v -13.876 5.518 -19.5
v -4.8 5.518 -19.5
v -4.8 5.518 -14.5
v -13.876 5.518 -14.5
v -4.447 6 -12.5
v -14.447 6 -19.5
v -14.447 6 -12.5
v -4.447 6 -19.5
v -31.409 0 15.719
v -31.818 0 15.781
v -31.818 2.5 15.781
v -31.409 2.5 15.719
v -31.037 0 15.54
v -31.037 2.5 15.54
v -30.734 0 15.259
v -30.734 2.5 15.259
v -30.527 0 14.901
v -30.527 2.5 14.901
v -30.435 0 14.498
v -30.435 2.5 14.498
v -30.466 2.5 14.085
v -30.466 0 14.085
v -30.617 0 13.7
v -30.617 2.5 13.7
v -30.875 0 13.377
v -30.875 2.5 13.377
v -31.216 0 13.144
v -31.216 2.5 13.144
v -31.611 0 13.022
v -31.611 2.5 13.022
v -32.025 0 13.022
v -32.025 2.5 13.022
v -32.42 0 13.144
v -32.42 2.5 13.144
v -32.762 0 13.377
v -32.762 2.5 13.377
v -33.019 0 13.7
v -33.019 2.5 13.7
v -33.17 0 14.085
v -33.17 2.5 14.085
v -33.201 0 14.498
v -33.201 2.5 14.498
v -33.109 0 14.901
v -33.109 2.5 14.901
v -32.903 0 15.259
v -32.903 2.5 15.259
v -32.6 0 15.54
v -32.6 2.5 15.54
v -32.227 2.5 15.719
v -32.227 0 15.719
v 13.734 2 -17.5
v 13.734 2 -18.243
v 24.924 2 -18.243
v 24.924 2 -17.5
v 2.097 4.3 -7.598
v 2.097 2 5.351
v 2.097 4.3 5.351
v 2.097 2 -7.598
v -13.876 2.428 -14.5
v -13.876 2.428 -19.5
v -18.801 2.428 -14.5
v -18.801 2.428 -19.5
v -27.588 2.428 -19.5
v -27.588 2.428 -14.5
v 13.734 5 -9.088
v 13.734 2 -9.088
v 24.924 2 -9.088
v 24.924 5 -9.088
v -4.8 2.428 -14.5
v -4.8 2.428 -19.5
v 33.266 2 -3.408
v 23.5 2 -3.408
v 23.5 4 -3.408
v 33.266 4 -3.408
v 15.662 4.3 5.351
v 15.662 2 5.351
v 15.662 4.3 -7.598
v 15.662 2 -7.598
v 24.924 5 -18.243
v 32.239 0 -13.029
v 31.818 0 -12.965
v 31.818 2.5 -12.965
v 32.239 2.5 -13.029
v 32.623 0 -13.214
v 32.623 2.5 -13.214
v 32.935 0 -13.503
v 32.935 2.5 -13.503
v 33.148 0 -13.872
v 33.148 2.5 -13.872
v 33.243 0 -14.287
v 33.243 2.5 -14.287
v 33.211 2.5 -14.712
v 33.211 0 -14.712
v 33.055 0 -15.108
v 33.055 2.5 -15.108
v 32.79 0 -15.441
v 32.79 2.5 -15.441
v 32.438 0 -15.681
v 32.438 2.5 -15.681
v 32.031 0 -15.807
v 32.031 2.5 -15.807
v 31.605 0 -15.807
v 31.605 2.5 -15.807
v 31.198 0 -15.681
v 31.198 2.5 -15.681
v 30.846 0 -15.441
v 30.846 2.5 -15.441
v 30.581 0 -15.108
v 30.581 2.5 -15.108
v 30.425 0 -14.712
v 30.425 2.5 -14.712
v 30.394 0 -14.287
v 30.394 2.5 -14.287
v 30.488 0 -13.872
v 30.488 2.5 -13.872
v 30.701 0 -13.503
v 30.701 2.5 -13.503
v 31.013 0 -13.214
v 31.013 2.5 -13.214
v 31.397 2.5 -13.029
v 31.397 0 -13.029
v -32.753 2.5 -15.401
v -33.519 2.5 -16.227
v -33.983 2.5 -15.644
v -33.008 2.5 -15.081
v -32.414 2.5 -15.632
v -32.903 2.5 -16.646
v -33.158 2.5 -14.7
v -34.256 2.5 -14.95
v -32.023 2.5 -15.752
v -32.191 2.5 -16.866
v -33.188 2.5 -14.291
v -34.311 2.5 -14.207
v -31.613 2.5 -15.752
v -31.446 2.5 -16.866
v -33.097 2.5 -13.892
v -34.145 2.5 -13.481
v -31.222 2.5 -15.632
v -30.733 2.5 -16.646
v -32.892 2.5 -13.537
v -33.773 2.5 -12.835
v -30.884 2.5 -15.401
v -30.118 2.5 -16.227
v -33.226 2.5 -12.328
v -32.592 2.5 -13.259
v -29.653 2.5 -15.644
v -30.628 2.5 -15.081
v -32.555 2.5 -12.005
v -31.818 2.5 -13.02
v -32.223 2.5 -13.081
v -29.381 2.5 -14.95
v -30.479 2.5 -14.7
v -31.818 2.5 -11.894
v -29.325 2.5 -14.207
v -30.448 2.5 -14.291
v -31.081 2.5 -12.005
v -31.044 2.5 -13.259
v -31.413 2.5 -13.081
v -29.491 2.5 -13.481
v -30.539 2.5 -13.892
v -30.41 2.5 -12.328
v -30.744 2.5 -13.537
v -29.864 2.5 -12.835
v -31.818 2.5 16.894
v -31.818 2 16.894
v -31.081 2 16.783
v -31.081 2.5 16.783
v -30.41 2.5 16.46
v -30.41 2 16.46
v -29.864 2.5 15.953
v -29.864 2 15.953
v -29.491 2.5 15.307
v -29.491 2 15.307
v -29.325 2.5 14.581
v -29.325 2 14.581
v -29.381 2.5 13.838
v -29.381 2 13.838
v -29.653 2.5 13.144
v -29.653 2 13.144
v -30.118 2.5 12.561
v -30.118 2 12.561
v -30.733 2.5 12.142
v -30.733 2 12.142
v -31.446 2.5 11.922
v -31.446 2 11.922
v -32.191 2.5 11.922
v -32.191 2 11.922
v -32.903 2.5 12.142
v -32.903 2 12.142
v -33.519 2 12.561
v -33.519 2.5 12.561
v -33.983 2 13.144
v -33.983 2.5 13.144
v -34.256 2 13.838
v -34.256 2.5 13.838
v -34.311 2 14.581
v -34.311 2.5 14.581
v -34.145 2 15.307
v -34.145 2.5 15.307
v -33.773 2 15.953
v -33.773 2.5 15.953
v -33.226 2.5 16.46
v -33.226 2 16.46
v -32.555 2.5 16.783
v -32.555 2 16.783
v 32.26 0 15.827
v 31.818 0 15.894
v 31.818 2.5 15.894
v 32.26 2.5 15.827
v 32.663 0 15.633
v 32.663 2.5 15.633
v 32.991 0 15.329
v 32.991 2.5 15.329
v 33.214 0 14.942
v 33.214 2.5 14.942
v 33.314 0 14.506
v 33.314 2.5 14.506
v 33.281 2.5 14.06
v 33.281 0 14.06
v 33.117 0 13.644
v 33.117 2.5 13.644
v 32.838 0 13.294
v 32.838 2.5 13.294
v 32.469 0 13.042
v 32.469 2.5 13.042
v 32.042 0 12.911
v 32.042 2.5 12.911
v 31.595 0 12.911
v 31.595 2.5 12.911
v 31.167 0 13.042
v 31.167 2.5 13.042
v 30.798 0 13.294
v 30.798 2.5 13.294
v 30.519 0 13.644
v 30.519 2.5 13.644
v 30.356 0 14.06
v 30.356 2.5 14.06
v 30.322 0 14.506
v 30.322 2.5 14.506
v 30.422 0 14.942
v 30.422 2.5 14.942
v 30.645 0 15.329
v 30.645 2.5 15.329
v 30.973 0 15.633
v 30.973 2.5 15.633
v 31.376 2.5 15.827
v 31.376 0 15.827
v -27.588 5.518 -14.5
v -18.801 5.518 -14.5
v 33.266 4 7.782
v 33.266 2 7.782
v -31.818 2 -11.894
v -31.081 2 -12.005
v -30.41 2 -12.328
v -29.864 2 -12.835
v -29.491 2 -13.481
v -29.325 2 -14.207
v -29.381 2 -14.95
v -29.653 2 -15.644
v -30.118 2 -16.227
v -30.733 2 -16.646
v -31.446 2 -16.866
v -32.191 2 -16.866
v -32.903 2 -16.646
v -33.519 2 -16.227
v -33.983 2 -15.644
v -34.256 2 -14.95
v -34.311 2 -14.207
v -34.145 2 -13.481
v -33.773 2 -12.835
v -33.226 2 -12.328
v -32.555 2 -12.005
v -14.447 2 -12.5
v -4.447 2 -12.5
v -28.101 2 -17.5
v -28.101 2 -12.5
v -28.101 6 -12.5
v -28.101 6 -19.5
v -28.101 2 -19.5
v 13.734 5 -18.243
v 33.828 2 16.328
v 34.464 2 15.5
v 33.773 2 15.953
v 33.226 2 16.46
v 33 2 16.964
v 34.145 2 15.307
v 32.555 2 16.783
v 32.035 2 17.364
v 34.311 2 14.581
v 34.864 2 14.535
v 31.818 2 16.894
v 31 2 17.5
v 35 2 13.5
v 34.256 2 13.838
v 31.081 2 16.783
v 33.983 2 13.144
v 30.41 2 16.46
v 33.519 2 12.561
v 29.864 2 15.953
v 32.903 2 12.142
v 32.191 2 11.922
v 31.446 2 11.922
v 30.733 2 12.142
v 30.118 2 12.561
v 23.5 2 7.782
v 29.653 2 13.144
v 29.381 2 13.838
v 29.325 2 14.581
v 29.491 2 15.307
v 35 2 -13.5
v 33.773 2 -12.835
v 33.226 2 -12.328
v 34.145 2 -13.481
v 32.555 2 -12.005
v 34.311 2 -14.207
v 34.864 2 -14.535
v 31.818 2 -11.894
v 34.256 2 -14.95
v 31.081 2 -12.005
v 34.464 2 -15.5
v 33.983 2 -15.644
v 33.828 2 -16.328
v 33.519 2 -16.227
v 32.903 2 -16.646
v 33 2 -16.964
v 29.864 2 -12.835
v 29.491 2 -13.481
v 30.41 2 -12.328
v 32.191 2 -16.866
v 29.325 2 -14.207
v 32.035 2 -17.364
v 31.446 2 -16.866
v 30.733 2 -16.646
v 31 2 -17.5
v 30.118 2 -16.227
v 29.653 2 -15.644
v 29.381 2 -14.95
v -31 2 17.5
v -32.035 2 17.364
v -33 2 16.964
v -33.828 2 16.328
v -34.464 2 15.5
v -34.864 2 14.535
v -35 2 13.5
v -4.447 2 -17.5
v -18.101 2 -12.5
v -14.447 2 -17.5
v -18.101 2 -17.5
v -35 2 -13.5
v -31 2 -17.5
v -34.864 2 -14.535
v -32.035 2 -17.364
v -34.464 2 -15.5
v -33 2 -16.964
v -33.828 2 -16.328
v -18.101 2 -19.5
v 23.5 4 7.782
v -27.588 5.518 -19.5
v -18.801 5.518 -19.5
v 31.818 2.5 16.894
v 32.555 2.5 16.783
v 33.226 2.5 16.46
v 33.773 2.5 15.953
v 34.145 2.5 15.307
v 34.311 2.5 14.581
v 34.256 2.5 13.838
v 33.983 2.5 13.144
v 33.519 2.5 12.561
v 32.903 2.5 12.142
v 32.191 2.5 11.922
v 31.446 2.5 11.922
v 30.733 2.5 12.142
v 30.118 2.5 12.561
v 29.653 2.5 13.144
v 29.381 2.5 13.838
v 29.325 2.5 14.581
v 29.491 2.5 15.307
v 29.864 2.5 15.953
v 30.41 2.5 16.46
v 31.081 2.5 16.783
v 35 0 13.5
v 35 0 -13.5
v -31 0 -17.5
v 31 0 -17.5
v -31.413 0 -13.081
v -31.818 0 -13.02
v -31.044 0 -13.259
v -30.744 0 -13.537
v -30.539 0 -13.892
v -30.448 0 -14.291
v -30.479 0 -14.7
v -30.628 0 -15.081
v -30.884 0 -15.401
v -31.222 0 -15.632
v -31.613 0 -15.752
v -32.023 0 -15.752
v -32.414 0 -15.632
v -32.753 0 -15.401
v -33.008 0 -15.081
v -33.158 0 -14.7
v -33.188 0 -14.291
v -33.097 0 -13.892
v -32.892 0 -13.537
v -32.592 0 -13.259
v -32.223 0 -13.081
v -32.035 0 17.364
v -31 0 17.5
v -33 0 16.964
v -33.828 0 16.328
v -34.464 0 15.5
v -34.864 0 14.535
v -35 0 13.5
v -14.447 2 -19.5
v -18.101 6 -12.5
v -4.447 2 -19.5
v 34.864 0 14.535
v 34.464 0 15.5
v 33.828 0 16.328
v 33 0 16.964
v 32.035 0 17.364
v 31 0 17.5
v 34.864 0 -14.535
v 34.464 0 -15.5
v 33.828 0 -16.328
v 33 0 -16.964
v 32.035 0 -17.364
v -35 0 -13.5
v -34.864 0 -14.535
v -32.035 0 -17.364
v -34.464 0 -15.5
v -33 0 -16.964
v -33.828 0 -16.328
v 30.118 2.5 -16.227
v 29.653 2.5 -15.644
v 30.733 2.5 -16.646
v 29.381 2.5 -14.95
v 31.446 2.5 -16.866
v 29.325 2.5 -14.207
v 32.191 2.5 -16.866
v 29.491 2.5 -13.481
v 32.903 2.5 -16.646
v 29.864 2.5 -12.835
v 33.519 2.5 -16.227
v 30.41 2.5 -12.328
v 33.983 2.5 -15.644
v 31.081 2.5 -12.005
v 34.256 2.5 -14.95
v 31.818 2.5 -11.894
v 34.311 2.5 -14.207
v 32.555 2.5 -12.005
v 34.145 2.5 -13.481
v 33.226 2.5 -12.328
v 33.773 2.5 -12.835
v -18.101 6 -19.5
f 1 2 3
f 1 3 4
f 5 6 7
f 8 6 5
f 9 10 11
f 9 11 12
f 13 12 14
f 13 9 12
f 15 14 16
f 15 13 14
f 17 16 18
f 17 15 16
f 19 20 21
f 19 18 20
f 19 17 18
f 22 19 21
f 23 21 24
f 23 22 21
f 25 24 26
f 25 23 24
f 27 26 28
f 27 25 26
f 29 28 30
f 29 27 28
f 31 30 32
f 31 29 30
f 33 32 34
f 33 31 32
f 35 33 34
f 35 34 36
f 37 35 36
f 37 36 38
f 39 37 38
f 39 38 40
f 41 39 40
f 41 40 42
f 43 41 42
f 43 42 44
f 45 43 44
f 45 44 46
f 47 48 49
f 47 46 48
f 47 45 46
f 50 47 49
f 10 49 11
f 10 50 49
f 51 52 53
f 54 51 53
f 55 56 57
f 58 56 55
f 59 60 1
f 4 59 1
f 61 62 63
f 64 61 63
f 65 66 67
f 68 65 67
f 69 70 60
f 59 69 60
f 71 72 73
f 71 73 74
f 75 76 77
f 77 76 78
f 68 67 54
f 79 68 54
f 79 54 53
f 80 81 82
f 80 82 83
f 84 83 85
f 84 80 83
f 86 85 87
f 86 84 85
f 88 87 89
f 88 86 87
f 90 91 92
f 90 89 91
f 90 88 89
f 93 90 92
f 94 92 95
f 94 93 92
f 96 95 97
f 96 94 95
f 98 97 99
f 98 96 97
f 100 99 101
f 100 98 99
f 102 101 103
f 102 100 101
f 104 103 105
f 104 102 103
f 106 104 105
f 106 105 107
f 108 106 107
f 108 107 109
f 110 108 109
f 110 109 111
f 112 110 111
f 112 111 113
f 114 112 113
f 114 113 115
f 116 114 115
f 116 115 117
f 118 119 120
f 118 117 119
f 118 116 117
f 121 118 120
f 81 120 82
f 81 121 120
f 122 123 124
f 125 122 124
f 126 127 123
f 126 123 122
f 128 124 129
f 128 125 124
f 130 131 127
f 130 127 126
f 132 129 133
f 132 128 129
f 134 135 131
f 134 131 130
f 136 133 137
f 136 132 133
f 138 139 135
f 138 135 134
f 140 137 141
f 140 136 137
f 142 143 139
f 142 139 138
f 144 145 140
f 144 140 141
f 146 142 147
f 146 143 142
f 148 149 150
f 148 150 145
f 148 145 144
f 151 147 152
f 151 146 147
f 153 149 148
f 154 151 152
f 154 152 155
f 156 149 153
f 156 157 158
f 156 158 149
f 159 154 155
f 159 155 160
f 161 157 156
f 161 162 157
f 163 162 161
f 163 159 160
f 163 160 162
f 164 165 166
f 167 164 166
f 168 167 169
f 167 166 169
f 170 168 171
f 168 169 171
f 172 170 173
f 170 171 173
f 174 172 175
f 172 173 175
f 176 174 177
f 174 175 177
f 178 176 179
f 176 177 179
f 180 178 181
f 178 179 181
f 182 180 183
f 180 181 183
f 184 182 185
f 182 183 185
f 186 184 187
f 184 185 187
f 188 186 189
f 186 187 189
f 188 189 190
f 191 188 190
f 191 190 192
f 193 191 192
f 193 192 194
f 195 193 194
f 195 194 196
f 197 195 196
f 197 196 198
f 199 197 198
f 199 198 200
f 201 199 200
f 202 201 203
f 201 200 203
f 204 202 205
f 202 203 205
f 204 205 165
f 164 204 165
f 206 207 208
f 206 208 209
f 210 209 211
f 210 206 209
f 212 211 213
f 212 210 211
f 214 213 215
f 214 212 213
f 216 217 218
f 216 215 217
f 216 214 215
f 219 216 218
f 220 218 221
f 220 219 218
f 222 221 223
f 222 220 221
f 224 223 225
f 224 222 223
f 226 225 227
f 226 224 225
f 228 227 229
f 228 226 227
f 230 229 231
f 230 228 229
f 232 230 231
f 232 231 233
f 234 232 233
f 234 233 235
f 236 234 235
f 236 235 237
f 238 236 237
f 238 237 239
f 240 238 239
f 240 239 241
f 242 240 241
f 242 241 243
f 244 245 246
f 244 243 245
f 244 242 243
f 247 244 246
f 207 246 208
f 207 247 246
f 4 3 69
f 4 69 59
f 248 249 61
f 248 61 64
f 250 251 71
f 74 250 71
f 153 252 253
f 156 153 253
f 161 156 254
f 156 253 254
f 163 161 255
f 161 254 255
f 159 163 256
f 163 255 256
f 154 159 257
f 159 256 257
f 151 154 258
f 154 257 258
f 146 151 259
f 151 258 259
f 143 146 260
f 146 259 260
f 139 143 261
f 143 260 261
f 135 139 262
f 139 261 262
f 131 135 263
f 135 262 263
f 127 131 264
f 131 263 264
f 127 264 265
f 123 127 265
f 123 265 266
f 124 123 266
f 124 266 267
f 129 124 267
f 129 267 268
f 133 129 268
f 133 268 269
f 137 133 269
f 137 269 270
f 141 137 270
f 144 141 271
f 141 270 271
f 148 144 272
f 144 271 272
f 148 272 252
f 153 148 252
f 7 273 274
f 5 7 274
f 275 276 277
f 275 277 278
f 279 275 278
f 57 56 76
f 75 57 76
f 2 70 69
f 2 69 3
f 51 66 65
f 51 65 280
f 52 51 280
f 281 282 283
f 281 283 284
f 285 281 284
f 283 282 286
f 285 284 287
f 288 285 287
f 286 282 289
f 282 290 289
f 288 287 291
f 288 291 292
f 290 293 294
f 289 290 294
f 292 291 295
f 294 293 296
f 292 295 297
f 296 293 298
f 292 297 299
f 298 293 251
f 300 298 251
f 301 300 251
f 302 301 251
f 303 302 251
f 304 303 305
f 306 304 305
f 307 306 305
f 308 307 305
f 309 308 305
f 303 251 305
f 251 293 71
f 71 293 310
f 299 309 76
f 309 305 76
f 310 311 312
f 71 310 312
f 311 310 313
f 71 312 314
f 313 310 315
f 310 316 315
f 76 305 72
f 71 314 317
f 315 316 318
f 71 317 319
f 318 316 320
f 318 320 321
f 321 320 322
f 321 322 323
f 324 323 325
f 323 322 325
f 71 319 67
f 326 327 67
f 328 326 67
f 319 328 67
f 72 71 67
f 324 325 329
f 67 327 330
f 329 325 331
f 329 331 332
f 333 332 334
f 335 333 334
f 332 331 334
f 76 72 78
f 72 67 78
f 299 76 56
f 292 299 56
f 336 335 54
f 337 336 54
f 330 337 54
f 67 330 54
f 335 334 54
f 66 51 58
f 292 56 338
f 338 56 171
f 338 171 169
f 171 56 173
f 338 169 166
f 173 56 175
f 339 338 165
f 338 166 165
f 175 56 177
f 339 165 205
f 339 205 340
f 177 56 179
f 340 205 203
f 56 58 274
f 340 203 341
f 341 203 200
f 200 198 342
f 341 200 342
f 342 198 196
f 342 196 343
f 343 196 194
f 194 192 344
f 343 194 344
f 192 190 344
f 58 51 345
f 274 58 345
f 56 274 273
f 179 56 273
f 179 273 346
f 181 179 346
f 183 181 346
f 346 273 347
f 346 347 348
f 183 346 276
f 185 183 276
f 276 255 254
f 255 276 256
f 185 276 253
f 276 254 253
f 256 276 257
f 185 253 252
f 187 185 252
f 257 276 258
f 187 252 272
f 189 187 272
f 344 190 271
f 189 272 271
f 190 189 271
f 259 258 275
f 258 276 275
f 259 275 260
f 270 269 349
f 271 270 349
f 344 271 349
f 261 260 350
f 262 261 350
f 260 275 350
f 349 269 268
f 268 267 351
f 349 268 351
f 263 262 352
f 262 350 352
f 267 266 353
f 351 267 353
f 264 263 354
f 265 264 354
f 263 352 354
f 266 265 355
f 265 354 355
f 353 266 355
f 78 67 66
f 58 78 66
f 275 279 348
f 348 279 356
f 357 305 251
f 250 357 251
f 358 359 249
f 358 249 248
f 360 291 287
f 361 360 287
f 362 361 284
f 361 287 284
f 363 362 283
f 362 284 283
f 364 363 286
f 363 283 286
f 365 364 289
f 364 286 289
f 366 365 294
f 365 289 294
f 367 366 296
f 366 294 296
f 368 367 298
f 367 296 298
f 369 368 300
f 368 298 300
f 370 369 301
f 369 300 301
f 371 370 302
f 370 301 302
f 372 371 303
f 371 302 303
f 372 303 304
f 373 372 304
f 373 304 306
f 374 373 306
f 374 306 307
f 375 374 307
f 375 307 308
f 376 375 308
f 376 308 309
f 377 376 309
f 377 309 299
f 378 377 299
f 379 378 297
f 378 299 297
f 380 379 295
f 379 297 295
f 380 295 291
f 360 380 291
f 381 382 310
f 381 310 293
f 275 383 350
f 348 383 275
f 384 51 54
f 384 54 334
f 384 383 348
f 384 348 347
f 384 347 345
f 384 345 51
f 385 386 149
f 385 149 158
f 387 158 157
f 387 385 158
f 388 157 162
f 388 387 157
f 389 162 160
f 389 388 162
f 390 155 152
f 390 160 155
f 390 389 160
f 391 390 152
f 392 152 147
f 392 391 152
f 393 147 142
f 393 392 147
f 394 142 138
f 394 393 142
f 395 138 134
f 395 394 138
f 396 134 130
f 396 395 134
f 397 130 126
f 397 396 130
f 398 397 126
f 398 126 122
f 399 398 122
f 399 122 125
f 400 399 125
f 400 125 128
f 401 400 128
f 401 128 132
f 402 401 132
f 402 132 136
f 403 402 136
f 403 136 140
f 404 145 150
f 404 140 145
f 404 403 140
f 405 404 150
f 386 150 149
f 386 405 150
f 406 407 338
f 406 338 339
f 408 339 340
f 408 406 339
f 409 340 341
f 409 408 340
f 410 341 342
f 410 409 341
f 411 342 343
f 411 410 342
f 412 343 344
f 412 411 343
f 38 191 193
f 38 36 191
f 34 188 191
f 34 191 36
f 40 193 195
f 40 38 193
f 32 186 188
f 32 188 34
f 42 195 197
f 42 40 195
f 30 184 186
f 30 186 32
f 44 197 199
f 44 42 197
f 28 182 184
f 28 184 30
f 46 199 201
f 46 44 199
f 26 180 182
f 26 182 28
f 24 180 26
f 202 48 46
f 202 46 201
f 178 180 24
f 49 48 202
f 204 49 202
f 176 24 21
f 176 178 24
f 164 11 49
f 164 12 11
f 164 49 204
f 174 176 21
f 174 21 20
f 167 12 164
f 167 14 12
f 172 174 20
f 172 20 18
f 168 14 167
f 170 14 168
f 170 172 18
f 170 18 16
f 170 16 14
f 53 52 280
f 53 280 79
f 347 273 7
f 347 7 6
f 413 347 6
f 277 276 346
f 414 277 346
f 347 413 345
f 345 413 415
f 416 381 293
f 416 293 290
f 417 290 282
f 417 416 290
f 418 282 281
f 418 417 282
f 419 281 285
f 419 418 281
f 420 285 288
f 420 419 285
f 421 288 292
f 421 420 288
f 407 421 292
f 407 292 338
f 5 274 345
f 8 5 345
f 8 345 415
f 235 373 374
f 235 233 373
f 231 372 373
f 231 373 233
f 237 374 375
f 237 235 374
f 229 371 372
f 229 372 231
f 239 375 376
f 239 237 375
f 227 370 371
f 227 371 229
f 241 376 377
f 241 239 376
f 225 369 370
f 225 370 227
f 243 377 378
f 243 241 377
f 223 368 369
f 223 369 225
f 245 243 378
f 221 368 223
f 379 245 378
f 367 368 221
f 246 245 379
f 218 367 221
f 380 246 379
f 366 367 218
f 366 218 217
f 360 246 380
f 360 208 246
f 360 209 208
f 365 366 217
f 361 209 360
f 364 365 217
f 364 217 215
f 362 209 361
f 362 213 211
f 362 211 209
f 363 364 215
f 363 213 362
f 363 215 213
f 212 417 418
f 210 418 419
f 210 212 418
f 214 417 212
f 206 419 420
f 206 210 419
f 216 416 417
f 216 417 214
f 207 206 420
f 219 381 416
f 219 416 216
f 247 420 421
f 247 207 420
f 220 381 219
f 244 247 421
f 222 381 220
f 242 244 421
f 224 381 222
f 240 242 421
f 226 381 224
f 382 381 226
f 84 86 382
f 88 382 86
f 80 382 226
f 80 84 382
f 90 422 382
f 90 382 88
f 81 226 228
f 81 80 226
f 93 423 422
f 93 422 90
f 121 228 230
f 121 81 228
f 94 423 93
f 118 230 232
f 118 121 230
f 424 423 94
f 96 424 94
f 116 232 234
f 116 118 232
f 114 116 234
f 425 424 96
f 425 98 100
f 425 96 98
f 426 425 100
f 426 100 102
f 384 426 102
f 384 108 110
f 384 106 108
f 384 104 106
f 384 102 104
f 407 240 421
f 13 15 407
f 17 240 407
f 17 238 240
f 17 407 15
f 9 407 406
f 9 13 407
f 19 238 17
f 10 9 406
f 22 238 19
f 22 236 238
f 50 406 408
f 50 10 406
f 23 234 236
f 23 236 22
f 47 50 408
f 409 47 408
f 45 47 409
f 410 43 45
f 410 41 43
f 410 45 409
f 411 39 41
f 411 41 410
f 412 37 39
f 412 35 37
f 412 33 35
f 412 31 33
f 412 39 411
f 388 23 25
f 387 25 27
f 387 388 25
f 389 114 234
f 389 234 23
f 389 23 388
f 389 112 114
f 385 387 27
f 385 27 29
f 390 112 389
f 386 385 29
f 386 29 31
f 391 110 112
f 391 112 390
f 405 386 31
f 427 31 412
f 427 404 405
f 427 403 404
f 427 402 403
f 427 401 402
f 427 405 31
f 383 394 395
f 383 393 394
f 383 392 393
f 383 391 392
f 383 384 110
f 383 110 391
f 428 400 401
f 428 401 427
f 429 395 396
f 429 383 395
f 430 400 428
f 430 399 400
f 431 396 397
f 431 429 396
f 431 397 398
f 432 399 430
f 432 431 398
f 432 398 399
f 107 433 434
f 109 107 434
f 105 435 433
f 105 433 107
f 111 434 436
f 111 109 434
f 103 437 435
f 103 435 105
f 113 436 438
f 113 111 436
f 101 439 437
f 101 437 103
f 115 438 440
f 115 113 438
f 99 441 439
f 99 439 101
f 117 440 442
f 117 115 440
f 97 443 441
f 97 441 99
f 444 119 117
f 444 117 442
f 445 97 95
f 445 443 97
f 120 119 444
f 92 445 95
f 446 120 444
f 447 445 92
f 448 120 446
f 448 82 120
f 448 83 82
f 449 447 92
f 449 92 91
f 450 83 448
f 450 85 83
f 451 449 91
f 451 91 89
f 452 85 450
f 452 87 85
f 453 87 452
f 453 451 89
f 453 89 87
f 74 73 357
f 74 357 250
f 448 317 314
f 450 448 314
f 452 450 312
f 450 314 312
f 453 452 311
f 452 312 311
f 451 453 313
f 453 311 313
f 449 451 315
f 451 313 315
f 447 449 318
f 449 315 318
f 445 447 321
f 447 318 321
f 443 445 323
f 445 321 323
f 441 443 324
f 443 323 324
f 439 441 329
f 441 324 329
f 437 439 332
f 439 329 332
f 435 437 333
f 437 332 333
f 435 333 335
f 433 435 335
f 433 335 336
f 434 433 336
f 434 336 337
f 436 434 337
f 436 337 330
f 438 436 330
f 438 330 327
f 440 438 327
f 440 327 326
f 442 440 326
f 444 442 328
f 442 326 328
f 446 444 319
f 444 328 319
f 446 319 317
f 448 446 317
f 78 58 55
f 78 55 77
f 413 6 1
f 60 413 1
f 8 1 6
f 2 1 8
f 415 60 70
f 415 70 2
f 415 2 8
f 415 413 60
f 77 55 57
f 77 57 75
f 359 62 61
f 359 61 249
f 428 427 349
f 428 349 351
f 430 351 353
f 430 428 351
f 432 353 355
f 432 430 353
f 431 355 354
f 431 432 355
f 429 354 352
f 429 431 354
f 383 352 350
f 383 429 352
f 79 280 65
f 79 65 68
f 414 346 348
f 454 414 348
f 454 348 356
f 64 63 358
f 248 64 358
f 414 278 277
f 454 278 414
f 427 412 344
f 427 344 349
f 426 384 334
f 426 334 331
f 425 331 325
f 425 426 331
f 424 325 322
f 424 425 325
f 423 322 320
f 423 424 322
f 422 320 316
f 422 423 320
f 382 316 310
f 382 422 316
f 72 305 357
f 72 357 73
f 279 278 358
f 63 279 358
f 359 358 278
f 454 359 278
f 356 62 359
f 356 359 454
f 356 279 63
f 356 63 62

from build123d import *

# Parameters (mm, degrees)
BOSS_EXTRUDE1_DEPTH     = 2
SKETCH2_R               = 2.5
BOSS_EXTRUDE2_DEPTH     = 0.5
CUT_EXTRUDE1_DEPTH      = 40.182266397
CUT_EXTRUDE1_DEPTH_BACK = 40.182266397
SKETCH3_R               = 1.5
SKETCH3_R_2             = 1.3870402
SKETCH3_R_3             = 1.37388591
SKETCH3_R_4             = 1.428673318
SKETCH4_W               = 13.56544722
SKETCH4_H               = 12.948835983
BOSS_EXTRUDE3_DEPTH     = 2.3
SKETCH5_W               = 9.766151407
SKETCH5_H               = 11.19038182
BOSS_EXTRUDE4_DEPTH     = 2
SKETCH6_W               = 10
SKETCH6_H               = 7
BOSS_EXTRUDE5_DEPTH     = 4
SKETCH7_W               = 9.076584157
SKETCH7_H               = 3.089900989
SKETCH7_W_2             = 8.786905938
CUT_EXTRUDE2_DEPTH      = 5
SKETCH8_W               = 11.190381821
SKETCH8_H               = 9.155766944
BOSS_EXTRUDE6_DEPTH     = 3


with BuildPart() as part:
    # Sketch1 → Boss-Extrude1 (new body)
    with BuildSketch(Plane(origin=(0, 0, 0), x_dir=(1, 0, 0), z_dir=(0, 1, 0))):
        with BuildLine():
            Line((-31, 17.5), (31, 17.5))
            ThreePointArc((31, 17.5), (33.828427125, 16.328427125), (35, 13.5))
            Line((35, 13.5), (35, -13.5))
            ThreePointArc((35, -13.5), (33.828427125, -16.328427125), (31, -17.5))
            Line((31, -17.5), (-31, -17.5))
            ThreePointArc((-31, -17.5), (-33.828427125, -16.328427125), (-35, -13.5))
            Line((-35, -13.5), (-35, 13.5))
            ThreePointArc((-35, 13.5), (-33.828427125, 16.328427125), (-31, 17.5))
        make_face()
    extrude(amount=BOSS_EXTRUDE1_DEPTH)

    # Sketch2 → Boss-Extrude2 (add)
    with BuildSketch(Plane(origin=(0, 2, 0), x_dir=(1, 0, 0), z_dir=(0, 1, 0))):
        with Locations(Location((31.818181818, -14.393939394, 0), (0, 0, 270))):
            Circle(SKETCH2_R)
        with Locations(Location((-31.818181818, -14.393939394, 0), (0, 0, 270))):
            Circle(SKETCH2_R)
        with Locations(Location((-31.818181818, 14.393939394, 0), (0, 0, 270))):
            Circle(SKETCH2_R)
        with Locations(Location((31.818181818, 14.393939394, 0), (0, 0, 270))):
            Circle(SKETCH2_R)
    extrude(amount=BOSS_EXTRUDE2_DEPTH)

    # Sketch3 → Cut-Extrude1 (cut, two sides: drawn at the far end of the back side and taken through both)
    with BuildSketch(Plane(origin=(0, 2, 0), x_dir=(1, 0, 0), z_dir=(0, 1, 0)).offset(-CUT_EXTRUDE1_DEPTH_BACK)):
        with Locations(Location((31.818181818, -14.393939394, 0), (0, 0, 270))):
            Circle(SKETCH3_R)
        with Locations(Location((-31.818181818, -14.393939394, 0), (0, 0, 270))):
            Circle(SKETCH3_R_2)
        with Locations(Location((-31.818181818, 14.393939394, 0), (0, 0, 270))):
            Circle(SKETCH3_R_3)
        with Locations(Location((31.818181818, 14.393939394, 0), (0, 0, 270))):
            Circle(SKETCH3_R_4)
    extrude(amount=CUT_EXTRUDE1_DEPTH + CUT_EXTRUDE1_DEPTH_BACK, mode=Mode.SUBTRACT)

    # Sketch4 → Boss-Extrude3 (add)
    with BuildSketch(Plane(origin=(0, 2, 0), x_dir=(1, 0, 0), z_dir=(0, 1, 0))):
        with Locations((8.879537688, 1.123716819)):
            Rectangle(SKETCH4_W, SKETCH4_H)
    extrude(amount=BOSS_EXTRUDE3_DEPTH)

    # Sketch5 → Boss-Extrude4 (add)
    with BuildSketch(Plane(origin=(0, 2, 0), x_dir=(1, 0, 0), z_dir=(0, 1, 0))):
        with Locations((28.382877527, -2.187210992)):
            Rectangle(SKETCH5_W, SKETCH5_H)
    extrude(amount=BOSS_EXTRUDE4_DEPTH)

    # Sketch6 → Boss-Extrude5 (add)
    with BuildSketch(Plane(origin=(0, 2, 0), x_dir=(1, 0, 0), z_dir=(0, 1, 0))):
        with Locations((-9.446594787, 16)):
            Rectangle(SKETCH6_W, SKETCH6_H)
        with Locations((-23.101167125, 16)):
            Rectangle(SKETCH6_W, SKETCH6_H)
    extrude(amount=BOSS_EXTRUDE5_DEPTH)

    # Sketch7 → Cut-Extrude2 (cut)
    with BuildSketch(Plane(origin=(0, 0, -19.5), x_dir=(-1, 0, 0), z_dir=(0, 0, -1))):
        with Locations((9.33789674, 3.973358643)):
            Rectangle(SKETCH7_W, SKETCH7_H)
        with Locations((23.19417149, 3.973358643)):
            Rectangle(SKETCH7_W_2, SKETCH7_H)
    extrude(amount=-CUT_EXTRUDE2_DEPTH, mode=Mode.SUBTRACT)

    # Sketch8 → Boss-Extrude6 (add)
    with BuildSketch(Plane(origin=(0, 2, 0), x_dir=(1, 0, 0), z_dir=(0, 1, 0))):
        with Locations((19.328841327, 13.665477606)):
            Rectangle(SKETCH8_W, SKETCH8_H)
    extrude(amount=BOSS_EXTRUDE6_DEPTH)


solid = part.part
